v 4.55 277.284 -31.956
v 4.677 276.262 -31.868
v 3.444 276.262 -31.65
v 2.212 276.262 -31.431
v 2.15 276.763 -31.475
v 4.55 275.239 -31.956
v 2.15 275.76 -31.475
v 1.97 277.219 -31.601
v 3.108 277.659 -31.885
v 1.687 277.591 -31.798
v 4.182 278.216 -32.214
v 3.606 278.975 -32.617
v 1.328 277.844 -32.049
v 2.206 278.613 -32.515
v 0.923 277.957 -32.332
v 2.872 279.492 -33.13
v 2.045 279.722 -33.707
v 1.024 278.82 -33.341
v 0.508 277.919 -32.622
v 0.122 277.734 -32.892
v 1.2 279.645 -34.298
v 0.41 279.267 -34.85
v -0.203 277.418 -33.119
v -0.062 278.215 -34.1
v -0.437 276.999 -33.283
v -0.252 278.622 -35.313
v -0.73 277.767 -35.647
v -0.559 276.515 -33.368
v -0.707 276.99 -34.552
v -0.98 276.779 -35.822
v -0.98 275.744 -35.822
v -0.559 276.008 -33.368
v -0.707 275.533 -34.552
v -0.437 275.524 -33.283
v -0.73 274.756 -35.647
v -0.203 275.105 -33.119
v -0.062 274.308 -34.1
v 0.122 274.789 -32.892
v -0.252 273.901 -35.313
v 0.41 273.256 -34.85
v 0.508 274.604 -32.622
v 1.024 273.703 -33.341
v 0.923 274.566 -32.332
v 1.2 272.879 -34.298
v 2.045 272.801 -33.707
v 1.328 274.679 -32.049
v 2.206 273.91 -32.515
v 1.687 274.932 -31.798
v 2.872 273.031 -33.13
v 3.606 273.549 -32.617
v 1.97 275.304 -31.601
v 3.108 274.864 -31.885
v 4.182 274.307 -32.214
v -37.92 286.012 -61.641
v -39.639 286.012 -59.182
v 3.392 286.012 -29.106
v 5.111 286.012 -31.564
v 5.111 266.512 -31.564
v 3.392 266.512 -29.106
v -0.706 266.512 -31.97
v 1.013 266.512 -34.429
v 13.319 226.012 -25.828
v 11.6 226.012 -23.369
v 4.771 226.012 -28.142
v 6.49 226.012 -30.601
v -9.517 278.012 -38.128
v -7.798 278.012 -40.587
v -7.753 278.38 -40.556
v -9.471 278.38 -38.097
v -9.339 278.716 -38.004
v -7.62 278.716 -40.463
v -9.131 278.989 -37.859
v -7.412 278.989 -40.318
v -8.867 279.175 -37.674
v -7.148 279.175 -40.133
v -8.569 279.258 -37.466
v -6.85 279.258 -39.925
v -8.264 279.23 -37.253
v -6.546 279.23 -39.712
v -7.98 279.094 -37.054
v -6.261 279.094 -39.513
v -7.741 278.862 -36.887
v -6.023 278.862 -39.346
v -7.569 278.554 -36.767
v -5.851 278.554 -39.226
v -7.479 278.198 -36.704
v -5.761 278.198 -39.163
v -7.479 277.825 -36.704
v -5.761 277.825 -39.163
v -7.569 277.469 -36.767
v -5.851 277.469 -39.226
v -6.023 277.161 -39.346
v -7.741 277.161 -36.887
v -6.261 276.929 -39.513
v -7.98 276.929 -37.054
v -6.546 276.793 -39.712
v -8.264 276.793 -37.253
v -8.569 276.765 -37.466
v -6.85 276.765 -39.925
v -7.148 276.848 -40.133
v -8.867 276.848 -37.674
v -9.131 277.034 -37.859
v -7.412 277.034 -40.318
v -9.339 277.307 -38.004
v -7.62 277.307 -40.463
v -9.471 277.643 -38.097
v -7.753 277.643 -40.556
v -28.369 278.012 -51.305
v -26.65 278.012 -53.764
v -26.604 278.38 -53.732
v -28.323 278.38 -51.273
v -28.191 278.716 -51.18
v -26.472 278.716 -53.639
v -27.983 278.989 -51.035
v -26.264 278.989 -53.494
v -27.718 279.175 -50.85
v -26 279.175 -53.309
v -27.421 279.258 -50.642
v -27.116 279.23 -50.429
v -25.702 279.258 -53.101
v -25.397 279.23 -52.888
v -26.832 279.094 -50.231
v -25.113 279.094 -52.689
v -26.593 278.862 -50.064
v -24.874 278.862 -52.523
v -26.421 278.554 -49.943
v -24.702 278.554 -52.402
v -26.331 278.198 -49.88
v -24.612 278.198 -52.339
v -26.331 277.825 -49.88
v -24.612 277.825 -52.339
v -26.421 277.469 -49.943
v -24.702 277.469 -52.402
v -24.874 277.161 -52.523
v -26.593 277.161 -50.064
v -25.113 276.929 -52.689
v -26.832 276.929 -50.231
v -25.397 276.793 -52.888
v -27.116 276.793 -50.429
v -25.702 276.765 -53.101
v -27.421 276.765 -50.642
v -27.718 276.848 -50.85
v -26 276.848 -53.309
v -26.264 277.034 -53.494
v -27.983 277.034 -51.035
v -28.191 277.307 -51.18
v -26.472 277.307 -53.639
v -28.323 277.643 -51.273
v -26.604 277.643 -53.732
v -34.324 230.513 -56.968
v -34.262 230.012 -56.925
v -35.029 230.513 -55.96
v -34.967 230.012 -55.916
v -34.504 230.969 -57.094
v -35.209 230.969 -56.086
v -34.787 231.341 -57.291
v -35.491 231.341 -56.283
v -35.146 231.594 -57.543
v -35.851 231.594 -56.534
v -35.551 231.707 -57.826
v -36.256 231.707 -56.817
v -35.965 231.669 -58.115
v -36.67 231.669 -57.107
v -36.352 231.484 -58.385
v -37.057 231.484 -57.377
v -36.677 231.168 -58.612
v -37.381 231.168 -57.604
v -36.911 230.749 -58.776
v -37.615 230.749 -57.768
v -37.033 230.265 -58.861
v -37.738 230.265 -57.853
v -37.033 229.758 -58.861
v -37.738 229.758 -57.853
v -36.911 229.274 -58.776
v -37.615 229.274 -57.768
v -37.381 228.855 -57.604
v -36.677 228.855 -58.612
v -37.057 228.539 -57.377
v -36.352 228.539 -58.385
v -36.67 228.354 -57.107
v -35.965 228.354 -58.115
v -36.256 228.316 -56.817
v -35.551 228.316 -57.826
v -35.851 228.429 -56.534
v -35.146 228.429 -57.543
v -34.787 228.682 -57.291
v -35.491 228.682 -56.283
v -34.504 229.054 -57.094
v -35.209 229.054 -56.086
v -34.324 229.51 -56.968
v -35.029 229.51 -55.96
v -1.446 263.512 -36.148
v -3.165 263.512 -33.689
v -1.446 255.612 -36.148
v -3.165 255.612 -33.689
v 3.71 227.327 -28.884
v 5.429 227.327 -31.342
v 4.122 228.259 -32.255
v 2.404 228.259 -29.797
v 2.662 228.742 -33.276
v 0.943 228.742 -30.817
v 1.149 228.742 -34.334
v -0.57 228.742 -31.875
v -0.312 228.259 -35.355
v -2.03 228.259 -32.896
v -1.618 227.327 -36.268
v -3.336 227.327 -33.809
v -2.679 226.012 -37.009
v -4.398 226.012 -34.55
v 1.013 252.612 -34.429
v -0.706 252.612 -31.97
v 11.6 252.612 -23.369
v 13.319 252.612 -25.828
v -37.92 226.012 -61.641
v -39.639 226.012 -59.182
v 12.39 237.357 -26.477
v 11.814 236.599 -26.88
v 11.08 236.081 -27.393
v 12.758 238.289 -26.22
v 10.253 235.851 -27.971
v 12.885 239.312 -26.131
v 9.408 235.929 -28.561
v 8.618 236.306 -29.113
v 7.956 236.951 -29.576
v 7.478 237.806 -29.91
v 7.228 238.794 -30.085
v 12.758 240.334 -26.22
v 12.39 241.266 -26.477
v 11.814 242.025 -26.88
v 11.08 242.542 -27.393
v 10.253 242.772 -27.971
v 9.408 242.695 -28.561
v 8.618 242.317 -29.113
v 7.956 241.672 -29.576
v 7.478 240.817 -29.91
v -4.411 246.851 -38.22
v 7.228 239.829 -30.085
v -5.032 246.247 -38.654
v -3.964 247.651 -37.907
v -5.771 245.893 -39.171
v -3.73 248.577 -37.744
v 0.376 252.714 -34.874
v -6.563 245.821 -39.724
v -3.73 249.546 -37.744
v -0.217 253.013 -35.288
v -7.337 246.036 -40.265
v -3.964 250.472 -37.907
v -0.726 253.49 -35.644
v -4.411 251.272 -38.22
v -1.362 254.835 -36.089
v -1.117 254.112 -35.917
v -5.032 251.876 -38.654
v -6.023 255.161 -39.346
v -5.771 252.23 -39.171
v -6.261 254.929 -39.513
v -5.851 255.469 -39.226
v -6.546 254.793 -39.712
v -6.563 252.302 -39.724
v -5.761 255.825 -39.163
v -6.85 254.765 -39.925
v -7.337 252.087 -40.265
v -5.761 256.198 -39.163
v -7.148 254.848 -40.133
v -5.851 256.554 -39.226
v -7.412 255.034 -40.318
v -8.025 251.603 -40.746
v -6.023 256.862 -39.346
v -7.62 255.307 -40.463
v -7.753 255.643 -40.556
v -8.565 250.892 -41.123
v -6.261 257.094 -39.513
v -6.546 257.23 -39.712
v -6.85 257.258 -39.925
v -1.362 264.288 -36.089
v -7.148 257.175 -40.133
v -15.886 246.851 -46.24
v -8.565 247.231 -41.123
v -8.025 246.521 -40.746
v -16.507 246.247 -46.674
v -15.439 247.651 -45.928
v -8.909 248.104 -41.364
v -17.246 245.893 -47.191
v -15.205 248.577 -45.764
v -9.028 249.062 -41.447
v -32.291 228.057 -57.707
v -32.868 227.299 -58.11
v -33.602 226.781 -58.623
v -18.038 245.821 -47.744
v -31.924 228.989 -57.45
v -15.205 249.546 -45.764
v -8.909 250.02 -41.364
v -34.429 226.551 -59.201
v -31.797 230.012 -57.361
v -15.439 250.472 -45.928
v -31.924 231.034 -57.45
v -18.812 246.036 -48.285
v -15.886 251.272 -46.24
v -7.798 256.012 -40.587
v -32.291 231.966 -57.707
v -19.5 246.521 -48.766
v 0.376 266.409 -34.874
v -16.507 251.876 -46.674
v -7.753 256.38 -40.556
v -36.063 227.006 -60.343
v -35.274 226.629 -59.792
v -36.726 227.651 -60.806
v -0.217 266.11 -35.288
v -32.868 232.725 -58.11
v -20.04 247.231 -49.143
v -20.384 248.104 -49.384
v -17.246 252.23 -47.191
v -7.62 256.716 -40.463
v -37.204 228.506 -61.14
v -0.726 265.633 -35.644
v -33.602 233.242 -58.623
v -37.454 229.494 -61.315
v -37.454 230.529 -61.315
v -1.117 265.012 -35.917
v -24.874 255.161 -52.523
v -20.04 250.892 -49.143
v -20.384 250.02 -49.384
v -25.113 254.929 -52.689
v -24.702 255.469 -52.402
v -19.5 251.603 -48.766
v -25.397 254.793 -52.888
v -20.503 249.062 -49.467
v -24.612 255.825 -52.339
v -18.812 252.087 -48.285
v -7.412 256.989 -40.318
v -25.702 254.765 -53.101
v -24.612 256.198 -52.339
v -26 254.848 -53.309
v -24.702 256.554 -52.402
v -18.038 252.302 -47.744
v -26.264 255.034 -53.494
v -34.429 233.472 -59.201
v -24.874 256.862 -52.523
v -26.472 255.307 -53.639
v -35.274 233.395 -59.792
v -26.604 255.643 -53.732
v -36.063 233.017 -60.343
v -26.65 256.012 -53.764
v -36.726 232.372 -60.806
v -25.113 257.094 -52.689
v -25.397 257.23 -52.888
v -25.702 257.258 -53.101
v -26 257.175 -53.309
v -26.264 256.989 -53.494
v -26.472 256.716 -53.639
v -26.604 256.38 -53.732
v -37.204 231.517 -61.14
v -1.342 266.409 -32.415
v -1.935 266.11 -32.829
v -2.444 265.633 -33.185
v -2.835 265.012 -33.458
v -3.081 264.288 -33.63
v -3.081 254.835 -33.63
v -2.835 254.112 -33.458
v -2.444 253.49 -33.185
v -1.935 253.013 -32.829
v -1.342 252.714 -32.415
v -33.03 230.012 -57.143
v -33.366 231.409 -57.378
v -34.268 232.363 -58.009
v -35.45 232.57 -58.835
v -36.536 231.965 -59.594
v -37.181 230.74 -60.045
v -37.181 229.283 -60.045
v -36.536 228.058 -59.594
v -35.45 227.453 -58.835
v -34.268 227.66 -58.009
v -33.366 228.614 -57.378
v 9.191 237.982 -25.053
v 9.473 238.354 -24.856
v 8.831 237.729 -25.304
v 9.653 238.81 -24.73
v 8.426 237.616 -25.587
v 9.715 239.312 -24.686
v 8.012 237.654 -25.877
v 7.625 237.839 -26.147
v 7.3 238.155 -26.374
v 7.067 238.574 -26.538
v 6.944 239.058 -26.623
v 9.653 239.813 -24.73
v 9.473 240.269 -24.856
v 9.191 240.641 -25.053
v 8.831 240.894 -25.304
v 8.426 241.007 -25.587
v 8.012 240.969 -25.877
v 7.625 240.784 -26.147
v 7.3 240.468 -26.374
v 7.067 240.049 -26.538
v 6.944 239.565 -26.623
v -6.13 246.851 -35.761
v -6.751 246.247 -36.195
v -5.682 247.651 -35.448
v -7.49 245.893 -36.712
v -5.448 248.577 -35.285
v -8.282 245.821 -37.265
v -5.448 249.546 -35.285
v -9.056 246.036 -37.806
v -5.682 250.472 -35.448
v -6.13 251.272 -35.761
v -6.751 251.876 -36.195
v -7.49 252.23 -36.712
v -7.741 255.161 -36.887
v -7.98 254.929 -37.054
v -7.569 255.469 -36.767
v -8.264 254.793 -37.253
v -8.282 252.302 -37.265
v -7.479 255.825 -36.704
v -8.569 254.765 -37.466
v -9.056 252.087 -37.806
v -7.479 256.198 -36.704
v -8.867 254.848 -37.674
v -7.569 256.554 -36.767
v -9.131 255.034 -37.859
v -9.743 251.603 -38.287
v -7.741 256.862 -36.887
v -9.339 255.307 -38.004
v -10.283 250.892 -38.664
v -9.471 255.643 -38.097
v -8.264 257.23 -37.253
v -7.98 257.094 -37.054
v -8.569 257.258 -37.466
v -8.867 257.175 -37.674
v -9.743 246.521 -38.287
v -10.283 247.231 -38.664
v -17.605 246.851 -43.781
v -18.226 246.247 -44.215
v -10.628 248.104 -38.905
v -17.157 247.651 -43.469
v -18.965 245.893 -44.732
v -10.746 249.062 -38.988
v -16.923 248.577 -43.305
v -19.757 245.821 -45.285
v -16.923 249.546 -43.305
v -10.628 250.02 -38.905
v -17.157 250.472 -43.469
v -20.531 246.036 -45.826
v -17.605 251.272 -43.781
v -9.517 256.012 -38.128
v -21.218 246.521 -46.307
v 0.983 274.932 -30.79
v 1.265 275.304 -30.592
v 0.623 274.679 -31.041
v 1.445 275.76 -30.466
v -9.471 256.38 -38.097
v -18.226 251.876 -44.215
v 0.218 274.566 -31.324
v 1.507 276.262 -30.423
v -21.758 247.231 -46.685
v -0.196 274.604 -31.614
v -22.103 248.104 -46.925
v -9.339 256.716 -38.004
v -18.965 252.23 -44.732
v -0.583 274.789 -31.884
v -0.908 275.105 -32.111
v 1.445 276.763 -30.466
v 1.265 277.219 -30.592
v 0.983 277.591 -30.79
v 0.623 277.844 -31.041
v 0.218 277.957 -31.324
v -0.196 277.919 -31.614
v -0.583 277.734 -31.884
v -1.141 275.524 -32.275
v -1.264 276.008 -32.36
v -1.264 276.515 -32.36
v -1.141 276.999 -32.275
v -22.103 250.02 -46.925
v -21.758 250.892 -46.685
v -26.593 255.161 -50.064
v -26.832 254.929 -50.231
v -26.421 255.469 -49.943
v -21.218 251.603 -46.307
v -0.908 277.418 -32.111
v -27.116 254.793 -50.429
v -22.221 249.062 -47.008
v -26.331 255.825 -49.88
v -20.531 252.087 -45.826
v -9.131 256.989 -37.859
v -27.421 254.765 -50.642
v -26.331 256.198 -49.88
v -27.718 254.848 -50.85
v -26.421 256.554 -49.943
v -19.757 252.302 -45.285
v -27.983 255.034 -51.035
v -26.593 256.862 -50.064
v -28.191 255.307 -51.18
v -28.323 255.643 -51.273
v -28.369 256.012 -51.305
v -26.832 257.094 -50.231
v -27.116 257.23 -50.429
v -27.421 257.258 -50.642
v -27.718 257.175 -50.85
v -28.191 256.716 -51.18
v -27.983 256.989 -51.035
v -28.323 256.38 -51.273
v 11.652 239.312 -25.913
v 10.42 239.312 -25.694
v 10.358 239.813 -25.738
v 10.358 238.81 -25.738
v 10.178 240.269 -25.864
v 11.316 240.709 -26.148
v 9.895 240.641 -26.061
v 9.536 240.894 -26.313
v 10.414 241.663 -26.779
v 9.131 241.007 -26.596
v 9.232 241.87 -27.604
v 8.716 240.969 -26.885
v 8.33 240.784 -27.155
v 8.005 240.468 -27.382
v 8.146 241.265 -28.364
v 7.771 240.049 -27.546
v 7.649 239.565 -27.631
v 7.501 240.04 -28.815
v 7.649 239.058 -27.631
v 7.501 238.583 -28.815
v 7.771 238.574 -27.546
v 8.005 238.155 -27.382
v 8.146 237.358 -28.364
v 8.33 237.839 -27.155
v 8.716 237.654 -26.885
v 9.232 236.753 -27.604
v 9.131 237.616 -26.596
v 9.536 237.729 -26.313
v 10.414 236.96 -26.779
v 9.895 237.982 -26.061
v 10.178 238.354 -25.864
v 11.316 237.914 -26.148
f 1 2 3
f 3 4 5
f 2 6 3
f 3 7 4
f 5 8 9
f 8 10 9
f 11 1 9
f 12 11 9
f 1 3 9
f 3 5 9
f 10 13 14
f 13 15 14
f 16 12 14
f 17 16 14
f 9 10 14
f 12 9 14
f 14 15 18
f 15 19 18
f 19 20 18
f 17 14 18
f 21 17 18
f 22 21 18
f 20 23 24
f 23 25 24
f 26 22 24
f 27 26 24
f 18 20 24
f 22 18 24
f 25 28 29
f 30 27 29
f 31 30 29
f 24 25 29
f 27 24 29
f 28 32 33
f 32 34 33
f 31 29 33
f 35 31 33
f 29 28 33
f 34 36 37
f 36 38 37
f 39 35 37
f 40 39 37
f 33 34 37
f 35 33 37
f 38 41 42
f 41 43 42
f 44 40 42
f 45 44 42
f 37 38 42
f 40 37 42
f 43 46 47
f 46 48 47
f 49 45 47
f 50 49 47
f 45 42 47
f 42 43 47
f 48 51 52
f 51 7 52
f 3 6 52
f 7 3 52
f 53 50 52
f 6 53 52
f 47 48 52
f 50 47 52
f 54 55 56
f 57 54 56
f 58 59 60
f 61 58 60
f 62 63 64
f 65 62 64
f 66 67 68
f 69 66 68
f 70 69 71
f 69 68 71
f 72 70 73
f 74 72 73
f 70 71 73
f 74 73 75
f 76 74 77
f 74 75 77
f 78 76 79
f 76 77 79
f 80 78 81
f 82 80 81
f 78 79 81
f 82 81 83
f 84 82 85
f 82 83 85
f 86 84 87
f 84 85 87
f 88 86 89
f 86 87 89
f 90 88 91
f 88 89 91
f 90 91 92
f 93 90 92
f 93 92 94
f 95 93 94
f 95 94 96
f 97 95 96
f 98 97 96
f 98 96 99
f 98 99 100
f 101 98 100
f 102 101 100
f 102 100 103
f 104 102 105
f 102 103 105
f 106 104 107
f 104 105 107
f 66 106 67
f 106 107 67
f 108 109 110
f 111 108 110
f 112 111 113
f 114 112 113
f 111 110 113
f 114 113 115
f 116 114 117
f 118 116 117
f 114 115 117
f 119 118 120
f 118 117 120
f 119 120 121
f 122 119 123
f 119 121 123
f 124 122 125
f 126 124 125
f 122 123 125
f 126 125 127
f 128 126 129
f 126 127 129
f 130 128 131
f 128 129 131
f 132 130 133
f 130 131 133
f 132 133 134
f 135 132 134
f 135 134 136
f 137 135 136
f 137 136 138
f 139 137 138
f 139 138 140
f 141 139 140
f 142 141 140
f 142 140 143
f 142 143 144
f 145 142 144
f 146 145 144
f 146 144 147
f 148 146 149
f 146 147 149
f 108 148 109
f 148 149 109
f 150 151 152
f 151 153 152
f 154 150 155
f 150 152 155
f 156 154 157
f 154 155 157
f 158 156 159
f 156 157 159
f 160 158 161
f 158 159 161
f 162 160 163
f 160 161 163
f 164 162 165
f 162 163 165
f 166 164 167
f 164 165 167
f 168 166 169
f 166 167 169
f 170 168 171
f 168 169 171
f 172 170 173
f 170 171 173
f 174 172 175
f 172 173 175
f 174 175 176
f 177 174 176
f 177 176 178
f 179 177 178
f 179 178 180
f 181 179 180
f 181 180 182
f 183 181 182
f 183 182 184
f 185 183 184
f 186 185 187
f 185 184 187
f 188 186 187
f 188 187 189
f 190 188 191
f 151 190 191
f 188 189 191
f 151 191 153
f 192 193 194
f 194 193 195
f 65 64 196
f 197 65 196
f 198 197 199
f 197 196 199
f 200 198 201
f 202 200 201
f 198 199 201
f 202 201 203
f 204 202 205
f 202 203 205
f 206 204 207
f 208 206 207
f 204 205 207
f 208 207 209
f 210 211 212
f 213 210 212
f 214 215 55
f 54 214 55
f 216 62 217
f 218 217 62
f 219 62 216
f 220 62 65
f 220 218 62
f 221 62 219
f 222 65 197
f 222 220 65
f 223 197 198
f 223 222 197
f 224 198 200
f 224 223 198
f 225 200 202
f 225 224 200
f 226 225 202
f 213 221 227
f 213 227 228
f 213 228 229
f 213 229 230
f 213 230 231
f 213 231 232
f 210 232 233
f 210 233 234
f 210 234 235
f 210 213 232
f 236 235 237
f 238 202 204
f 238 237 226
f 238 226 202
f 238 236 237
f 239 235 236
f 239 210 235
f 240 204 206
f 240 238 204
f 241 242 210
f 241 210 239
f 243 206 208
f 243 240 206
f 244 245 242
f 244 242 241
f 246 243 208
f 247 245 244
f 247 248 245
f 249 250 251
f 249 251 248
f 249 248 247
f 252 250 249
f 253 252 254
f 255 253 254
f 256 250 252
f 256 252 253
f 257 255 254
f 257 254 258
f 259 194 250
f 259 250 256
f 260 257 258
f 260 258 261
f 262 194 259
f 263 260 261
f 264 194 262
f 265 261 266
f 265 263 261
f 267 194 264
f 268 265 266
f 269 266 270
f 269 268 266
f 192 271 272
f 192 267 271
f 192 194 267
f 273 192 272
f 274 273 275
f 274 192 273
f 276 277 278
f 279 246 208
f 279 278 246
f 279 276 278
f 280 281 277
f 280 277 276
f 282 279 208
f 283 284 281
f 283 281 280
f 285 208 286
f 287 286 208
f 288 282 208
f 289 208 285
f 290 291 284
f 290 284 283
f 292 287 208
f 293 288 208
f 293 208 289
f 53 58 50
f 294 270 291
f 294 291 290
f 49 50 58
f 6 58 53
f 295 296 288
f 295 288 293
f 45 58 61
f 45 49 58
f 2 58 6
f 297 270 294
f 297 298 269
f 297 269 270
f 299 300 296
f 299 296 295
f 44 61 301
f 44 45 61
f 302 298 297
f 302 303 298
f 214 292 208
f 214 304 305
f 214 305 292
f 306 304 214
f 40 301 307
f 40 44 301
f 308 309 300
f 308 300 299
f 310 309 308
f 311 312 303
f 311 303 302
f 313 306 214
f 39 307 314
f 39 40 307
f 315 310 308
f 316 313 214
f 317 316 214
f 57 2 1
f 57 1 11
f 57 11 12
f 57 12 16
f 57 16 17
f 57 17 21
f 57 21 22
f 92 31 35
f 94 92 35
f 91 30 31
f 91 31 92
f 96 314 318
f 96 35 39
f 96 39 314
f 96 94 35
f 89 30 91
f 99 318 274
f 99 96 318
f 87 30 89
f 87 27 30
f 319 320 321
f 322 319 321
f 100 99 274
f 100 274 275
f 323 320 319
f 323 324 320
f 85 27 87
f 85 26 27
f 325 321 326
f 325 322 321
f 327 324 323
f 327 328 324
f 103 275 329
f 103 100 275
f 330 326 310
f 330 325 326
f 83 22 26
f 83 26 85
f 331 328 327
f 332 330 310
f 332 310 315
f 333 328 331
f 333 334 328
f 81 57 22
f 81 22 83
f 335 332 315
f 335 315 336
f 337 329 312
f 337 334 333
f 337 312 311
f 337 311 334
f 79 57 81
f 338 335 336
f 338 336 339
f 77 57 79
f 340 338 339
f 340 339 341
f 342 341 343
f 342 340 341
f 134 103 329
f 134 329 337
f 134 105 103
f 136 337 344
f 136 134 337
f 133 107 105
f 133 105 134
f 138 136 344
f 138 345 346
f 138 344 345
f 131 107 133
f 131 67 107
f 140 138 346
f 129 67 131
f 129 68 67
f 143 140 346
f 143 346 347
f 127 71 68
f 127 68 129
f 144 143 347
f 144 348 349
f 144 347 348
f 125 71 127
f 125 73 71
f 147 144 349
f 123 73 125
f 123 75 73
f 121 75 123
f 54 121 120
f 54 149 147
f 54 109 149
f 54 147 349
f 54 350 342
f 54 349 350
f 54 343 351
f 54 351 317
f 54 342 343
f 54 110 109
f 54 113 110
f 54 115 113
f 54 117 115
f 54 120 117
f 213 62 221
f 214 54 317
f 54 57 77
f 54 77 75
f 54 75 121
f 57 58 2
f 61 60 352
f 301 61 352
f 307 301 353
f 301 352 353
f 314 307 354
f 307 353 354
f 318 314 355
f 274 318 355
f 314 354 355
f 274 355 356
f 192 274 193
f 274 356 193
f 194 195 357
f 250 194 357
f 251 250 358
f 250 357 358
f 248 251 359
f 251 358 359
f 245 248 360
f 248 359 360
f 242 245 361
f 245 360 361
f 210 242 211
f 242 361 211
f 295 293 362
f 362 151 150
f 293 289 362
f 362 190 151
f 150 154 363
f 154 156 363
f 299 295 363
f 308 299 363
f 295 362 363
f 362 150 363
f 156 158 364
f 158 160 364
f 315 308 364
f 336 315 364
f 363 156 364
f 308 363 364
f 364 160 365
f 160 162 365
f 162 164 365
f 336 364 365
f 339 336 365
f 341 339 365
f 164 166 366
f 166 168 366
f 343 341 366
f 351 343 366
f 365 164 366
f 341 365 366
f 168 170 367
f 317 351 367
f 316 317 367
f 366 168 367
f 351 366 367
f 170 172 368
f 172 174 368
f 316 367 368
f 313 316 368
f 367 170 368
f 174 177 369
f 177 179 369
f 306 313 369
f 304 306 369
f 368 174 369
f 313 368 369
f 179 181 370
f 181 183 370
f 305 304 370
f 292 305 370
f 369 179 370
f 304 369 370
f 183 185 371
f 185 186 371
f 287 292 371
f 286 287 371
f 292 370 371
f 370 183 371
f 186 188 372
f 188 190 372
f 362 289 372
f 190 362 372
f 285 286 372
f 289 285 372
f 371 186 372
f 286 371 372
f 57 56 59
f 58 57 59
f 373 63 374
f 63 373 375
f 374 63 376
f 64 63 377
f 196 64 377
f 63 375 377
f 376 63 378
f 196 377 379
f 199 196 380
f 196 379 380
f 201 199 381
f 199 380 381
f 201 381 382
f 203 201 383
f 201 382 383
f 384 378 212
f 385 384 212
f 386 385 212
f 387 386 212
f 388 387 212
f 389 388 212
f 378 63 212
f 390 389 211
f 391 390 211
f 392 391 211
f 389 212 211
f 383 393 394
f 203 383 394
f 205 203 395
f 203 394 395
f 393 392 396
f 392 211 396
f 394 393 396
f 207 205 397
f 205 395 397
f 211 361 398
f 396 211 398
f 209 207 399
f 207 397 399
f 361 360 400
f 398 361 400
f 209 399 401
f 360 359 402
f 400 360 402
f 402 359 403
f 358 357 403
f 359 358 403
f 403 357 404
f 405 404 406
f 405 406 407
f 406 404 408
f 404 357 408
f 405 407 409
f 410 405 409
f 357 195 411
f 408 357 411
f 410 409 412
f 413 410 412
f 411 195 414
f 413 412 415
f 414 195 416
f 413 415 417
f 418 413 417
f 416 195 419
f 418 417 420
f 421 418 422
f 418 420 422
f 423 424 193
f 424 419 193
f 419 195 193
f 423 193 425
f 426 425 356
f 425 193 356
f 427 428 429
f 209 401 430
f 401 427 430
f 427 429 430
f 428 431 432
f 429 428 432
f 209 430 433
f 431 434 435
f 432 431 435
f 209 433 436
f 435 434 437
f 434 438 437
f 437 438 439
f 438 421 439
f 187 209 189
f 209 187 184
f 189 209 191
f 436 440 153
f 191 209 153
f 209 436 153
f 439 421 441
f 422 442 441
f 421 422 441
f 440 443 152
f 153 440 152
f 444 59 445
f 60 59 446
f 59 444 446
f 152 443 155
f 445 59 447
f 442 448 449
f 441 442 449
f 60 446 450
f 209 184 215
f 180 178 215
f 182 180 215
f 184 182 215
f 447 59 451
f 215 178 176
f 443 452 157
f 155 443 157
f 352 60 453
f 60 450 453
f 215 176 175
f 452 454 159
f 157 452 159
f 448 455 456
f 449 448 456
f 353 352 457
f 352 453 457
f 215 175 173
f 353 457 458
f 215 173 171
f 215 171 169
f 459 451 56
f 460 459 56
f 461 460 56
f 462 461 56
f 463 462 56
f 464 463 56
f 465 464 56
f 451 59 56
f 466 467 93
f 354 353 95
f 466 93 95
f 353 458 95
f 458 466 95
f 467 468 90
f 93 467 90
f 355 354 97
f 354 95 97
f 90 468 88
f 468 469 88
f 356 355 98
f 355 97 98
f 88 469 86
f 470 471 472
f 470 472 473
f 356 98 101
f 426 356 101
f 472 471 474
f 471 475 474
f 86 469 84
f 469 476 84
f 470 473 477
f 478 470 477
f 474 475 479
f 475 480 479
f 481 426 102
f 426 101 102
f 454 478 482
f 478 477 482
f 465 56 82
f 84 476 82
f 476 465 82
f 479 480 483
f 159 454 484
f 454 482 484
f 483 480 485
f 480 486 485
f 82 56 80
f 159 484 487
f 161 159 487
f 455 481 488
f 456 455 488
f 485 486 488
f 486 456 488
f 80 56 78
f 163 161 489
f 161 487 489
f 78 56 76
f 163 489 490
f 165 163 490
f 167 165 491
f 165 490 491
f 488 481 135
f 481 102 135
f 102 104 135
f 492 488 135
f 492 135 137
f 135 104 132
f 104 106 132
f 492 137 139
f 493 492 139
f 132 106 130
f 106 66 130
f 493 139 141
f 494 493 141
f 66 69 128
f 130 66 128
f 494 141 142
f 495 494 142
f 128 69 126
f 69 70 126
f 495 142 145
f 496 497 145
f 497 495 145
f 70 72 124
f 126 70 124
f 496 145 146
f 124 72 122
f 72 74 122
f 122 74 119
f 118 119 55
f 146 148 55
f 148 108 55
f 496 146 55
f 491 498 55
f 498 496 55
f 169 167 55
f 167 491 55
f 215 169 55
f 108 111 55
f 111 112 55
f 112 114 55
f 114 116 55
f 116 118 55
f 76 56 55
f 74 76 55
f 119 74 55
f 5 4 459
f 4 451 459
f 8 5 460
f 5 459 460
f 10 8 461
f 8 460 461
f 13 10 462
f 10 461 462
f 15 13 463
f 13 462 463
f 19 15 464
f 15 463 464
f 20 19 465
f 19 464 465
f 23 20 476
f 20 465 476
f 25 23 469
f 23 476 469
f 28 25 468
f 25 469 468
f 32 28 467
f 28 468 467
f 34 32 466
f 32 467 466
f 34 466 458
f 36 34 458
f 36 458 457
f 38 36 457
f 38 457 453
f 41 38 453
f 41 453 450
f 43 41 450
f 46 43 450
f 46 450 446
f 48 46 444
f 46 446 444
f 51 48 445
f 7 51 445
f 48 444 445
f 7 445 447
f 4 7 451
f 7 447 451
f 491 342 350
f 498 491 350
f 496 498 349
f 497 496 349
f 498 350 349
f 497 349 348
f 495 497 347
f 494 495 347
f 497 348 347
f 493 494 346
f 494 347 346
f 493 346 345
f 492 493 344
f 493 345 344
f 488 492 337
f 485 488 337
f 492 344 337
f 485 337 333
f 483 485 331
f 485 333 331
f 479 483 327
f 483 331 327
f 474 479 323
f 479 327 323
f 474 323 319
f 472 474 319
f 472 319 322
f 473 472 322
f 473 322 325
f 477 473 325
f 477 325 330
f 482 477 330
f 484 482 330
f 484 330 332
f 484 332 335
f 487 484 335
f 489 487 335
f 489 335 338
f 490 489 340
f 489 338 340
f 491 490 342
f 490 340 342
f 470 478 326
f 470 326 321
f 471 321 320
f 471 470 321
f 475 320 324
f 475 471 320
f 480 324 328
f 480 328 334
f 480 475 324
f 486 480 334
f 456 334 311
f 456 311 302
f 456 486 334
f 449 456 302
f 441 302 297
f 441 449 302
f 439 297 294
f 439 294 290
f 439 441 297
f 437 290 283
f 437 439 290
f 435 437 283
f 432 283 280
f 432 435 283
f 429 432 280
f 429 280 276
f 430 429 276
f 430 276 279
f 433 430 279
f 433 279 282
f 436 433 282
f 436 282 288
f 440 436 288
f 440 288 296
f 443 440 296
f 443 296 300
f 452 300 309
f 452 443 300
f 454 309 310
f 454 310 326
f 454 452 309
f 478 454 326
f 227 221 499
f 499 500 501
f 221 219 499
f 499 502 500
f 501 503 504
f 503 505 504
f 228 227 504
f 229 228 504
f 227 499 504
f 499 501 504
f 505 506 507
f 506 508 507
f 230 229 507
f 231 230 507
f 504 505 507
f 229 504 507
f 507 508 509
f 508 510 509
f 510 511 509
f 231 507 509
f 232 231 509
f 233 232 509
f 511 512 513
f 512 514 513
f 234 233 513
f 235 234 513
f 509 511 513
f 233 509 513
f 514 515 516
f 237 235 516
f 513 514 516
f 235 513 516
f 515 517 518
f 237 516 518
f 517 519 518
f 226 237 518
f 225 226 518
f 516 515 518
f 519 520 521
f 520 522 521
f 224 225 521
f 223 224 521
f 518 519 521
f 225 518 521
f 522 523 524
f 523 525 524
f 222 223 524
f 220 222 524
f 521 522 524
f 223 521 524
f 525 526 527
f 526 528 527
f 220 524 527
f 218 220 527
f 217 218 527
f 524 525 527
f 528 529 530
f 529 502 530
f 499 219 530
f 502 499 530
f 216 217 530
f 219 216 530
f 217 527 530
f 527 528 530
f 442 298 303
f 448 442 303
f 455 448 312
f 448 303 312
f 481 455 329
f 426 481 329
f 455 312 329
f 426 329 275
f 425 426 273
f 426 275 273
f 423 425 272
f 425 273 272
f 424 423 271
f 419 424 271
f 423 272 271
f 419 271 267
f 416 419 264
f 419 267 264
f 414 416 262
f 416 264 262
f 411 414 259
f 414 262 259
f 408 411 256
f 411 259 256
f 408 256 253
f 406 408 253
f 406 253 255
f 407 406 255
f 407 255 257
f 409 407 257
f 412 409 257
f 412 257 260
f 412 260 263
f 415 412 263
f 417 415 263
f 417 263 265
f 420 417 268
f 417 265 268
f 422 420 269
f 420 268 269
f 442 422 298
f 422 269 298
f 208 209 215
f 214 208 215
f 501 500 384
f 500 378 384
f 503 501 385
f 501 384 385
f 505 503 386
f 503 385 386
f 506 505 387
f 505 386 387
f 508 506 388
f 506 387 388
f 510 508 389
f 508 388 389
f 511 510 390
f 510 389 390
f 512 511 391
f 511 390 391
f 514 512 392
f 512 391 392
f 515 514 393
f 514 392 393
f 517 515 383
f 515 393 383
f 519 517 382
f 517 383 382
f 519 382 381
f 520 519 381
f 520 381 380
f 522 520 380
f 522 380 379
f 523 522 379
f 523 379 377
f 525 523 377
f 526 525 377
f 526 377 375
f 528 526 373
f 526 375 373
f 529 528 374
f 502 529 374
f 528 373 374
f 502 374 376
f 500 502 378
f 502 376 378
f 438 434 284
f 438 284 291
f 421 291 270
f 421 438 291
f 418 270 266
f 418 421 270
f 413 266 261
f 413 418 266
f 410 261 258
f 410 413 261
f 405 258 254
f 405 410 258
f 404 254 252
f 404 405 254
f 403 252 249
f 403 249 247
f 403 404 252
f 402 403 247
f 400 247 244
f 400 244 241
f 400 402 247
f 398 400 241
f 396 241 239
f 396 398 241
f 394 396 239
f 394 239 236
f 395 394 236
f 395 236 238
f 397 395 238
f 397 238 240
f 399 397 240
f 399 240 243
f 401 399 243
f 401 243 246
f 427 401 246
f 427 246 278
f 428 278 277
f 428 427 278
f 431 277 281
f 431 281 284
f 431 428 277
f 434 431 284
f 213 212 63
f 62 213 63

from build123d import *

# Parameters (mm, degrees)
SKETCH1_R                                            = 3.25
BOSS_EXTRUDE1_DEPTH                                  = 3
SKETCH7_R                                            = 1.25
CUT_EXTRUDE1_DEPTH                                   = 3
CSK_FOR_M3_HEX_SOCKET_COUNTERSUNK_HEAD_S_D           = 3.4
CSK_FOR_M3_HEX_SOCKET_COUNTERSUNK_HEAD_S_DEPTH       = 3
CSK_FOR_M3_HEX_SOCKET_COUNTERSUNK_HEAD_S_CSINK_D     = 6.94
CSK_FOR_M3_HEX_SOCKET_COUNTERSUNK_HEAD_S_CSINK_ANGLE = 90
CSK_FOR_M3_HEX_SOCKET_COUNTERSUNK_HEAD_S_TIP         = 1.021463052


with BuildPart() as part:
    # Sketch1 → Boss-Extrude1 (new body)
    with BuildSketch(Plane(origin=(14.780047825, 0, -21.146325355), x_dir=(-0.8196392423560167, 0, -0.5728800157014161), z_dir=(0.5728800157014161, 0, -0.8196392423560169))):
        with BuildLine():
            Line((13.893407272, 266.511550752), (18.893407272, 266.511550752))
            ThreePointArc((18.893407272, 266.511550752), (21.014727616, 265.632871095), (21.893407272, 263.511550752))
            Line((21.893407272, 263.511550752), (21.893407272, 255.611550752))
            ThreePointArc((21.893407272, 255.611550752), (21.014727616, 253.490230408), (18.893407272, 252.611550752))
            Line((18.893407272, 252.611550752), (3.879256414, 252.611550752))
            Line((3.879256414, 252.611550752), (3.879256414, 226.011550752))
            Line((3.879256414, 226.011550752), (12.21108842, 226.011550752))
            ThreePointArc((12.21108842, 226.011550752), (17.804454002, 228.802722193), (23.397819584, 226.011550752))
            Line((23.397819584, 226.011550752), (66.393407272, 226.011550752))
            Line((66.393407272, 226.011550752), (66.393407272, 286.011550752))
            Line((66.393407272, 286.011550752), (13.893407272, 286.011550752))
            Line((13.893407272, 286.011550752), (13.893407272, 266.511550752))
        make_face()
        with Locations((27.893407272, 249.061550752)):
            Circle(SKETCH1_R, mode=Mode.SUBTRACT)
        with Locations((41.893407272, 249.061550752)):
            Circle(SKETCH1_R, mode=Mode.SUBTRACT)
    extrude(amount=BOSS_EXTRUDE1_DEPTH)

    # Sketch7 → Cut-Extrude1 (cut)
    with BuildSketch(Plane(origin=(16.498687872, 0, -23.605243082), x_dir=(-0.8196392423560169, 0, -0.572880015701416), z_dir=(0.572880015701416, 0, -0.8196392423560169))):
        with Locations((28.393407272, 278.011550752)):
            Circle(SKETCH7_R)
        with Locations((51.393407272, 278.011550752)):
            Circle(SKETCH7_R)
        with Locations((28.393407272, 256.011550752)):
            Circle(SKETCH7_R)
        with Locations((51.393407272, 256.011550752)):
            Circle(SKETCH7_R)
    extrude(amount=-CUT_EXTRUDE1_DEPTH, mode=Mode.SUBTRACT)

    # CSK for M3 Hex Socket Countersunk Head Screw2
    with Locations(Plane(origin=(16.498687872, 0, -23.605243082), x_dir=(-0.8196392423560169, 0, -0.572880015701416), z_dir=(0.572880015701416, 0, -0.819639242356017))):
        with Locations((17.893407272, 276.261550752), (7.879256414, 239.311550752), (62.393407272, 230.011550752)):
            CounterSinkHole(CSK_FOR_M3_HEX_SOCKET_COUNTERSUNK_HEAD_S_D / 2, CSK_FOR_M3_HEX_SOCKET_COUNTERSUNK_HEAD_S_CSINK_D / 2, depth=CSK_FOR_M3_HEX_SOCKET_COUNTERSUNK_HEAD_S_DEPTH, counter_sink_angle=CSK_FOR_M3_HEX_SOCKET_COUNTERSUNK_HEAD_S_CSINK_ANGLE)
            with Locations((0, 0, -(CSK_FOR_M3_HEX_SOCKET_COUNTERSUNK_HEAD_S_DEPTH + CSK_FOR_M3_HEX_SOCKET_COUNTERSUNK_HEAD_S_TIP / 2))):  # 118° drill point
                Cone(0, CSK_FOR_M3_HEX_SOCKET_COUNTERSUNK_HEAD_S_D / 2, CSK_FOR_M3_HEX_SOCKET_COUNTERSUNK_HEAD_S_TIP, mode=Mode.SUBTRACT)


solid = part.part
